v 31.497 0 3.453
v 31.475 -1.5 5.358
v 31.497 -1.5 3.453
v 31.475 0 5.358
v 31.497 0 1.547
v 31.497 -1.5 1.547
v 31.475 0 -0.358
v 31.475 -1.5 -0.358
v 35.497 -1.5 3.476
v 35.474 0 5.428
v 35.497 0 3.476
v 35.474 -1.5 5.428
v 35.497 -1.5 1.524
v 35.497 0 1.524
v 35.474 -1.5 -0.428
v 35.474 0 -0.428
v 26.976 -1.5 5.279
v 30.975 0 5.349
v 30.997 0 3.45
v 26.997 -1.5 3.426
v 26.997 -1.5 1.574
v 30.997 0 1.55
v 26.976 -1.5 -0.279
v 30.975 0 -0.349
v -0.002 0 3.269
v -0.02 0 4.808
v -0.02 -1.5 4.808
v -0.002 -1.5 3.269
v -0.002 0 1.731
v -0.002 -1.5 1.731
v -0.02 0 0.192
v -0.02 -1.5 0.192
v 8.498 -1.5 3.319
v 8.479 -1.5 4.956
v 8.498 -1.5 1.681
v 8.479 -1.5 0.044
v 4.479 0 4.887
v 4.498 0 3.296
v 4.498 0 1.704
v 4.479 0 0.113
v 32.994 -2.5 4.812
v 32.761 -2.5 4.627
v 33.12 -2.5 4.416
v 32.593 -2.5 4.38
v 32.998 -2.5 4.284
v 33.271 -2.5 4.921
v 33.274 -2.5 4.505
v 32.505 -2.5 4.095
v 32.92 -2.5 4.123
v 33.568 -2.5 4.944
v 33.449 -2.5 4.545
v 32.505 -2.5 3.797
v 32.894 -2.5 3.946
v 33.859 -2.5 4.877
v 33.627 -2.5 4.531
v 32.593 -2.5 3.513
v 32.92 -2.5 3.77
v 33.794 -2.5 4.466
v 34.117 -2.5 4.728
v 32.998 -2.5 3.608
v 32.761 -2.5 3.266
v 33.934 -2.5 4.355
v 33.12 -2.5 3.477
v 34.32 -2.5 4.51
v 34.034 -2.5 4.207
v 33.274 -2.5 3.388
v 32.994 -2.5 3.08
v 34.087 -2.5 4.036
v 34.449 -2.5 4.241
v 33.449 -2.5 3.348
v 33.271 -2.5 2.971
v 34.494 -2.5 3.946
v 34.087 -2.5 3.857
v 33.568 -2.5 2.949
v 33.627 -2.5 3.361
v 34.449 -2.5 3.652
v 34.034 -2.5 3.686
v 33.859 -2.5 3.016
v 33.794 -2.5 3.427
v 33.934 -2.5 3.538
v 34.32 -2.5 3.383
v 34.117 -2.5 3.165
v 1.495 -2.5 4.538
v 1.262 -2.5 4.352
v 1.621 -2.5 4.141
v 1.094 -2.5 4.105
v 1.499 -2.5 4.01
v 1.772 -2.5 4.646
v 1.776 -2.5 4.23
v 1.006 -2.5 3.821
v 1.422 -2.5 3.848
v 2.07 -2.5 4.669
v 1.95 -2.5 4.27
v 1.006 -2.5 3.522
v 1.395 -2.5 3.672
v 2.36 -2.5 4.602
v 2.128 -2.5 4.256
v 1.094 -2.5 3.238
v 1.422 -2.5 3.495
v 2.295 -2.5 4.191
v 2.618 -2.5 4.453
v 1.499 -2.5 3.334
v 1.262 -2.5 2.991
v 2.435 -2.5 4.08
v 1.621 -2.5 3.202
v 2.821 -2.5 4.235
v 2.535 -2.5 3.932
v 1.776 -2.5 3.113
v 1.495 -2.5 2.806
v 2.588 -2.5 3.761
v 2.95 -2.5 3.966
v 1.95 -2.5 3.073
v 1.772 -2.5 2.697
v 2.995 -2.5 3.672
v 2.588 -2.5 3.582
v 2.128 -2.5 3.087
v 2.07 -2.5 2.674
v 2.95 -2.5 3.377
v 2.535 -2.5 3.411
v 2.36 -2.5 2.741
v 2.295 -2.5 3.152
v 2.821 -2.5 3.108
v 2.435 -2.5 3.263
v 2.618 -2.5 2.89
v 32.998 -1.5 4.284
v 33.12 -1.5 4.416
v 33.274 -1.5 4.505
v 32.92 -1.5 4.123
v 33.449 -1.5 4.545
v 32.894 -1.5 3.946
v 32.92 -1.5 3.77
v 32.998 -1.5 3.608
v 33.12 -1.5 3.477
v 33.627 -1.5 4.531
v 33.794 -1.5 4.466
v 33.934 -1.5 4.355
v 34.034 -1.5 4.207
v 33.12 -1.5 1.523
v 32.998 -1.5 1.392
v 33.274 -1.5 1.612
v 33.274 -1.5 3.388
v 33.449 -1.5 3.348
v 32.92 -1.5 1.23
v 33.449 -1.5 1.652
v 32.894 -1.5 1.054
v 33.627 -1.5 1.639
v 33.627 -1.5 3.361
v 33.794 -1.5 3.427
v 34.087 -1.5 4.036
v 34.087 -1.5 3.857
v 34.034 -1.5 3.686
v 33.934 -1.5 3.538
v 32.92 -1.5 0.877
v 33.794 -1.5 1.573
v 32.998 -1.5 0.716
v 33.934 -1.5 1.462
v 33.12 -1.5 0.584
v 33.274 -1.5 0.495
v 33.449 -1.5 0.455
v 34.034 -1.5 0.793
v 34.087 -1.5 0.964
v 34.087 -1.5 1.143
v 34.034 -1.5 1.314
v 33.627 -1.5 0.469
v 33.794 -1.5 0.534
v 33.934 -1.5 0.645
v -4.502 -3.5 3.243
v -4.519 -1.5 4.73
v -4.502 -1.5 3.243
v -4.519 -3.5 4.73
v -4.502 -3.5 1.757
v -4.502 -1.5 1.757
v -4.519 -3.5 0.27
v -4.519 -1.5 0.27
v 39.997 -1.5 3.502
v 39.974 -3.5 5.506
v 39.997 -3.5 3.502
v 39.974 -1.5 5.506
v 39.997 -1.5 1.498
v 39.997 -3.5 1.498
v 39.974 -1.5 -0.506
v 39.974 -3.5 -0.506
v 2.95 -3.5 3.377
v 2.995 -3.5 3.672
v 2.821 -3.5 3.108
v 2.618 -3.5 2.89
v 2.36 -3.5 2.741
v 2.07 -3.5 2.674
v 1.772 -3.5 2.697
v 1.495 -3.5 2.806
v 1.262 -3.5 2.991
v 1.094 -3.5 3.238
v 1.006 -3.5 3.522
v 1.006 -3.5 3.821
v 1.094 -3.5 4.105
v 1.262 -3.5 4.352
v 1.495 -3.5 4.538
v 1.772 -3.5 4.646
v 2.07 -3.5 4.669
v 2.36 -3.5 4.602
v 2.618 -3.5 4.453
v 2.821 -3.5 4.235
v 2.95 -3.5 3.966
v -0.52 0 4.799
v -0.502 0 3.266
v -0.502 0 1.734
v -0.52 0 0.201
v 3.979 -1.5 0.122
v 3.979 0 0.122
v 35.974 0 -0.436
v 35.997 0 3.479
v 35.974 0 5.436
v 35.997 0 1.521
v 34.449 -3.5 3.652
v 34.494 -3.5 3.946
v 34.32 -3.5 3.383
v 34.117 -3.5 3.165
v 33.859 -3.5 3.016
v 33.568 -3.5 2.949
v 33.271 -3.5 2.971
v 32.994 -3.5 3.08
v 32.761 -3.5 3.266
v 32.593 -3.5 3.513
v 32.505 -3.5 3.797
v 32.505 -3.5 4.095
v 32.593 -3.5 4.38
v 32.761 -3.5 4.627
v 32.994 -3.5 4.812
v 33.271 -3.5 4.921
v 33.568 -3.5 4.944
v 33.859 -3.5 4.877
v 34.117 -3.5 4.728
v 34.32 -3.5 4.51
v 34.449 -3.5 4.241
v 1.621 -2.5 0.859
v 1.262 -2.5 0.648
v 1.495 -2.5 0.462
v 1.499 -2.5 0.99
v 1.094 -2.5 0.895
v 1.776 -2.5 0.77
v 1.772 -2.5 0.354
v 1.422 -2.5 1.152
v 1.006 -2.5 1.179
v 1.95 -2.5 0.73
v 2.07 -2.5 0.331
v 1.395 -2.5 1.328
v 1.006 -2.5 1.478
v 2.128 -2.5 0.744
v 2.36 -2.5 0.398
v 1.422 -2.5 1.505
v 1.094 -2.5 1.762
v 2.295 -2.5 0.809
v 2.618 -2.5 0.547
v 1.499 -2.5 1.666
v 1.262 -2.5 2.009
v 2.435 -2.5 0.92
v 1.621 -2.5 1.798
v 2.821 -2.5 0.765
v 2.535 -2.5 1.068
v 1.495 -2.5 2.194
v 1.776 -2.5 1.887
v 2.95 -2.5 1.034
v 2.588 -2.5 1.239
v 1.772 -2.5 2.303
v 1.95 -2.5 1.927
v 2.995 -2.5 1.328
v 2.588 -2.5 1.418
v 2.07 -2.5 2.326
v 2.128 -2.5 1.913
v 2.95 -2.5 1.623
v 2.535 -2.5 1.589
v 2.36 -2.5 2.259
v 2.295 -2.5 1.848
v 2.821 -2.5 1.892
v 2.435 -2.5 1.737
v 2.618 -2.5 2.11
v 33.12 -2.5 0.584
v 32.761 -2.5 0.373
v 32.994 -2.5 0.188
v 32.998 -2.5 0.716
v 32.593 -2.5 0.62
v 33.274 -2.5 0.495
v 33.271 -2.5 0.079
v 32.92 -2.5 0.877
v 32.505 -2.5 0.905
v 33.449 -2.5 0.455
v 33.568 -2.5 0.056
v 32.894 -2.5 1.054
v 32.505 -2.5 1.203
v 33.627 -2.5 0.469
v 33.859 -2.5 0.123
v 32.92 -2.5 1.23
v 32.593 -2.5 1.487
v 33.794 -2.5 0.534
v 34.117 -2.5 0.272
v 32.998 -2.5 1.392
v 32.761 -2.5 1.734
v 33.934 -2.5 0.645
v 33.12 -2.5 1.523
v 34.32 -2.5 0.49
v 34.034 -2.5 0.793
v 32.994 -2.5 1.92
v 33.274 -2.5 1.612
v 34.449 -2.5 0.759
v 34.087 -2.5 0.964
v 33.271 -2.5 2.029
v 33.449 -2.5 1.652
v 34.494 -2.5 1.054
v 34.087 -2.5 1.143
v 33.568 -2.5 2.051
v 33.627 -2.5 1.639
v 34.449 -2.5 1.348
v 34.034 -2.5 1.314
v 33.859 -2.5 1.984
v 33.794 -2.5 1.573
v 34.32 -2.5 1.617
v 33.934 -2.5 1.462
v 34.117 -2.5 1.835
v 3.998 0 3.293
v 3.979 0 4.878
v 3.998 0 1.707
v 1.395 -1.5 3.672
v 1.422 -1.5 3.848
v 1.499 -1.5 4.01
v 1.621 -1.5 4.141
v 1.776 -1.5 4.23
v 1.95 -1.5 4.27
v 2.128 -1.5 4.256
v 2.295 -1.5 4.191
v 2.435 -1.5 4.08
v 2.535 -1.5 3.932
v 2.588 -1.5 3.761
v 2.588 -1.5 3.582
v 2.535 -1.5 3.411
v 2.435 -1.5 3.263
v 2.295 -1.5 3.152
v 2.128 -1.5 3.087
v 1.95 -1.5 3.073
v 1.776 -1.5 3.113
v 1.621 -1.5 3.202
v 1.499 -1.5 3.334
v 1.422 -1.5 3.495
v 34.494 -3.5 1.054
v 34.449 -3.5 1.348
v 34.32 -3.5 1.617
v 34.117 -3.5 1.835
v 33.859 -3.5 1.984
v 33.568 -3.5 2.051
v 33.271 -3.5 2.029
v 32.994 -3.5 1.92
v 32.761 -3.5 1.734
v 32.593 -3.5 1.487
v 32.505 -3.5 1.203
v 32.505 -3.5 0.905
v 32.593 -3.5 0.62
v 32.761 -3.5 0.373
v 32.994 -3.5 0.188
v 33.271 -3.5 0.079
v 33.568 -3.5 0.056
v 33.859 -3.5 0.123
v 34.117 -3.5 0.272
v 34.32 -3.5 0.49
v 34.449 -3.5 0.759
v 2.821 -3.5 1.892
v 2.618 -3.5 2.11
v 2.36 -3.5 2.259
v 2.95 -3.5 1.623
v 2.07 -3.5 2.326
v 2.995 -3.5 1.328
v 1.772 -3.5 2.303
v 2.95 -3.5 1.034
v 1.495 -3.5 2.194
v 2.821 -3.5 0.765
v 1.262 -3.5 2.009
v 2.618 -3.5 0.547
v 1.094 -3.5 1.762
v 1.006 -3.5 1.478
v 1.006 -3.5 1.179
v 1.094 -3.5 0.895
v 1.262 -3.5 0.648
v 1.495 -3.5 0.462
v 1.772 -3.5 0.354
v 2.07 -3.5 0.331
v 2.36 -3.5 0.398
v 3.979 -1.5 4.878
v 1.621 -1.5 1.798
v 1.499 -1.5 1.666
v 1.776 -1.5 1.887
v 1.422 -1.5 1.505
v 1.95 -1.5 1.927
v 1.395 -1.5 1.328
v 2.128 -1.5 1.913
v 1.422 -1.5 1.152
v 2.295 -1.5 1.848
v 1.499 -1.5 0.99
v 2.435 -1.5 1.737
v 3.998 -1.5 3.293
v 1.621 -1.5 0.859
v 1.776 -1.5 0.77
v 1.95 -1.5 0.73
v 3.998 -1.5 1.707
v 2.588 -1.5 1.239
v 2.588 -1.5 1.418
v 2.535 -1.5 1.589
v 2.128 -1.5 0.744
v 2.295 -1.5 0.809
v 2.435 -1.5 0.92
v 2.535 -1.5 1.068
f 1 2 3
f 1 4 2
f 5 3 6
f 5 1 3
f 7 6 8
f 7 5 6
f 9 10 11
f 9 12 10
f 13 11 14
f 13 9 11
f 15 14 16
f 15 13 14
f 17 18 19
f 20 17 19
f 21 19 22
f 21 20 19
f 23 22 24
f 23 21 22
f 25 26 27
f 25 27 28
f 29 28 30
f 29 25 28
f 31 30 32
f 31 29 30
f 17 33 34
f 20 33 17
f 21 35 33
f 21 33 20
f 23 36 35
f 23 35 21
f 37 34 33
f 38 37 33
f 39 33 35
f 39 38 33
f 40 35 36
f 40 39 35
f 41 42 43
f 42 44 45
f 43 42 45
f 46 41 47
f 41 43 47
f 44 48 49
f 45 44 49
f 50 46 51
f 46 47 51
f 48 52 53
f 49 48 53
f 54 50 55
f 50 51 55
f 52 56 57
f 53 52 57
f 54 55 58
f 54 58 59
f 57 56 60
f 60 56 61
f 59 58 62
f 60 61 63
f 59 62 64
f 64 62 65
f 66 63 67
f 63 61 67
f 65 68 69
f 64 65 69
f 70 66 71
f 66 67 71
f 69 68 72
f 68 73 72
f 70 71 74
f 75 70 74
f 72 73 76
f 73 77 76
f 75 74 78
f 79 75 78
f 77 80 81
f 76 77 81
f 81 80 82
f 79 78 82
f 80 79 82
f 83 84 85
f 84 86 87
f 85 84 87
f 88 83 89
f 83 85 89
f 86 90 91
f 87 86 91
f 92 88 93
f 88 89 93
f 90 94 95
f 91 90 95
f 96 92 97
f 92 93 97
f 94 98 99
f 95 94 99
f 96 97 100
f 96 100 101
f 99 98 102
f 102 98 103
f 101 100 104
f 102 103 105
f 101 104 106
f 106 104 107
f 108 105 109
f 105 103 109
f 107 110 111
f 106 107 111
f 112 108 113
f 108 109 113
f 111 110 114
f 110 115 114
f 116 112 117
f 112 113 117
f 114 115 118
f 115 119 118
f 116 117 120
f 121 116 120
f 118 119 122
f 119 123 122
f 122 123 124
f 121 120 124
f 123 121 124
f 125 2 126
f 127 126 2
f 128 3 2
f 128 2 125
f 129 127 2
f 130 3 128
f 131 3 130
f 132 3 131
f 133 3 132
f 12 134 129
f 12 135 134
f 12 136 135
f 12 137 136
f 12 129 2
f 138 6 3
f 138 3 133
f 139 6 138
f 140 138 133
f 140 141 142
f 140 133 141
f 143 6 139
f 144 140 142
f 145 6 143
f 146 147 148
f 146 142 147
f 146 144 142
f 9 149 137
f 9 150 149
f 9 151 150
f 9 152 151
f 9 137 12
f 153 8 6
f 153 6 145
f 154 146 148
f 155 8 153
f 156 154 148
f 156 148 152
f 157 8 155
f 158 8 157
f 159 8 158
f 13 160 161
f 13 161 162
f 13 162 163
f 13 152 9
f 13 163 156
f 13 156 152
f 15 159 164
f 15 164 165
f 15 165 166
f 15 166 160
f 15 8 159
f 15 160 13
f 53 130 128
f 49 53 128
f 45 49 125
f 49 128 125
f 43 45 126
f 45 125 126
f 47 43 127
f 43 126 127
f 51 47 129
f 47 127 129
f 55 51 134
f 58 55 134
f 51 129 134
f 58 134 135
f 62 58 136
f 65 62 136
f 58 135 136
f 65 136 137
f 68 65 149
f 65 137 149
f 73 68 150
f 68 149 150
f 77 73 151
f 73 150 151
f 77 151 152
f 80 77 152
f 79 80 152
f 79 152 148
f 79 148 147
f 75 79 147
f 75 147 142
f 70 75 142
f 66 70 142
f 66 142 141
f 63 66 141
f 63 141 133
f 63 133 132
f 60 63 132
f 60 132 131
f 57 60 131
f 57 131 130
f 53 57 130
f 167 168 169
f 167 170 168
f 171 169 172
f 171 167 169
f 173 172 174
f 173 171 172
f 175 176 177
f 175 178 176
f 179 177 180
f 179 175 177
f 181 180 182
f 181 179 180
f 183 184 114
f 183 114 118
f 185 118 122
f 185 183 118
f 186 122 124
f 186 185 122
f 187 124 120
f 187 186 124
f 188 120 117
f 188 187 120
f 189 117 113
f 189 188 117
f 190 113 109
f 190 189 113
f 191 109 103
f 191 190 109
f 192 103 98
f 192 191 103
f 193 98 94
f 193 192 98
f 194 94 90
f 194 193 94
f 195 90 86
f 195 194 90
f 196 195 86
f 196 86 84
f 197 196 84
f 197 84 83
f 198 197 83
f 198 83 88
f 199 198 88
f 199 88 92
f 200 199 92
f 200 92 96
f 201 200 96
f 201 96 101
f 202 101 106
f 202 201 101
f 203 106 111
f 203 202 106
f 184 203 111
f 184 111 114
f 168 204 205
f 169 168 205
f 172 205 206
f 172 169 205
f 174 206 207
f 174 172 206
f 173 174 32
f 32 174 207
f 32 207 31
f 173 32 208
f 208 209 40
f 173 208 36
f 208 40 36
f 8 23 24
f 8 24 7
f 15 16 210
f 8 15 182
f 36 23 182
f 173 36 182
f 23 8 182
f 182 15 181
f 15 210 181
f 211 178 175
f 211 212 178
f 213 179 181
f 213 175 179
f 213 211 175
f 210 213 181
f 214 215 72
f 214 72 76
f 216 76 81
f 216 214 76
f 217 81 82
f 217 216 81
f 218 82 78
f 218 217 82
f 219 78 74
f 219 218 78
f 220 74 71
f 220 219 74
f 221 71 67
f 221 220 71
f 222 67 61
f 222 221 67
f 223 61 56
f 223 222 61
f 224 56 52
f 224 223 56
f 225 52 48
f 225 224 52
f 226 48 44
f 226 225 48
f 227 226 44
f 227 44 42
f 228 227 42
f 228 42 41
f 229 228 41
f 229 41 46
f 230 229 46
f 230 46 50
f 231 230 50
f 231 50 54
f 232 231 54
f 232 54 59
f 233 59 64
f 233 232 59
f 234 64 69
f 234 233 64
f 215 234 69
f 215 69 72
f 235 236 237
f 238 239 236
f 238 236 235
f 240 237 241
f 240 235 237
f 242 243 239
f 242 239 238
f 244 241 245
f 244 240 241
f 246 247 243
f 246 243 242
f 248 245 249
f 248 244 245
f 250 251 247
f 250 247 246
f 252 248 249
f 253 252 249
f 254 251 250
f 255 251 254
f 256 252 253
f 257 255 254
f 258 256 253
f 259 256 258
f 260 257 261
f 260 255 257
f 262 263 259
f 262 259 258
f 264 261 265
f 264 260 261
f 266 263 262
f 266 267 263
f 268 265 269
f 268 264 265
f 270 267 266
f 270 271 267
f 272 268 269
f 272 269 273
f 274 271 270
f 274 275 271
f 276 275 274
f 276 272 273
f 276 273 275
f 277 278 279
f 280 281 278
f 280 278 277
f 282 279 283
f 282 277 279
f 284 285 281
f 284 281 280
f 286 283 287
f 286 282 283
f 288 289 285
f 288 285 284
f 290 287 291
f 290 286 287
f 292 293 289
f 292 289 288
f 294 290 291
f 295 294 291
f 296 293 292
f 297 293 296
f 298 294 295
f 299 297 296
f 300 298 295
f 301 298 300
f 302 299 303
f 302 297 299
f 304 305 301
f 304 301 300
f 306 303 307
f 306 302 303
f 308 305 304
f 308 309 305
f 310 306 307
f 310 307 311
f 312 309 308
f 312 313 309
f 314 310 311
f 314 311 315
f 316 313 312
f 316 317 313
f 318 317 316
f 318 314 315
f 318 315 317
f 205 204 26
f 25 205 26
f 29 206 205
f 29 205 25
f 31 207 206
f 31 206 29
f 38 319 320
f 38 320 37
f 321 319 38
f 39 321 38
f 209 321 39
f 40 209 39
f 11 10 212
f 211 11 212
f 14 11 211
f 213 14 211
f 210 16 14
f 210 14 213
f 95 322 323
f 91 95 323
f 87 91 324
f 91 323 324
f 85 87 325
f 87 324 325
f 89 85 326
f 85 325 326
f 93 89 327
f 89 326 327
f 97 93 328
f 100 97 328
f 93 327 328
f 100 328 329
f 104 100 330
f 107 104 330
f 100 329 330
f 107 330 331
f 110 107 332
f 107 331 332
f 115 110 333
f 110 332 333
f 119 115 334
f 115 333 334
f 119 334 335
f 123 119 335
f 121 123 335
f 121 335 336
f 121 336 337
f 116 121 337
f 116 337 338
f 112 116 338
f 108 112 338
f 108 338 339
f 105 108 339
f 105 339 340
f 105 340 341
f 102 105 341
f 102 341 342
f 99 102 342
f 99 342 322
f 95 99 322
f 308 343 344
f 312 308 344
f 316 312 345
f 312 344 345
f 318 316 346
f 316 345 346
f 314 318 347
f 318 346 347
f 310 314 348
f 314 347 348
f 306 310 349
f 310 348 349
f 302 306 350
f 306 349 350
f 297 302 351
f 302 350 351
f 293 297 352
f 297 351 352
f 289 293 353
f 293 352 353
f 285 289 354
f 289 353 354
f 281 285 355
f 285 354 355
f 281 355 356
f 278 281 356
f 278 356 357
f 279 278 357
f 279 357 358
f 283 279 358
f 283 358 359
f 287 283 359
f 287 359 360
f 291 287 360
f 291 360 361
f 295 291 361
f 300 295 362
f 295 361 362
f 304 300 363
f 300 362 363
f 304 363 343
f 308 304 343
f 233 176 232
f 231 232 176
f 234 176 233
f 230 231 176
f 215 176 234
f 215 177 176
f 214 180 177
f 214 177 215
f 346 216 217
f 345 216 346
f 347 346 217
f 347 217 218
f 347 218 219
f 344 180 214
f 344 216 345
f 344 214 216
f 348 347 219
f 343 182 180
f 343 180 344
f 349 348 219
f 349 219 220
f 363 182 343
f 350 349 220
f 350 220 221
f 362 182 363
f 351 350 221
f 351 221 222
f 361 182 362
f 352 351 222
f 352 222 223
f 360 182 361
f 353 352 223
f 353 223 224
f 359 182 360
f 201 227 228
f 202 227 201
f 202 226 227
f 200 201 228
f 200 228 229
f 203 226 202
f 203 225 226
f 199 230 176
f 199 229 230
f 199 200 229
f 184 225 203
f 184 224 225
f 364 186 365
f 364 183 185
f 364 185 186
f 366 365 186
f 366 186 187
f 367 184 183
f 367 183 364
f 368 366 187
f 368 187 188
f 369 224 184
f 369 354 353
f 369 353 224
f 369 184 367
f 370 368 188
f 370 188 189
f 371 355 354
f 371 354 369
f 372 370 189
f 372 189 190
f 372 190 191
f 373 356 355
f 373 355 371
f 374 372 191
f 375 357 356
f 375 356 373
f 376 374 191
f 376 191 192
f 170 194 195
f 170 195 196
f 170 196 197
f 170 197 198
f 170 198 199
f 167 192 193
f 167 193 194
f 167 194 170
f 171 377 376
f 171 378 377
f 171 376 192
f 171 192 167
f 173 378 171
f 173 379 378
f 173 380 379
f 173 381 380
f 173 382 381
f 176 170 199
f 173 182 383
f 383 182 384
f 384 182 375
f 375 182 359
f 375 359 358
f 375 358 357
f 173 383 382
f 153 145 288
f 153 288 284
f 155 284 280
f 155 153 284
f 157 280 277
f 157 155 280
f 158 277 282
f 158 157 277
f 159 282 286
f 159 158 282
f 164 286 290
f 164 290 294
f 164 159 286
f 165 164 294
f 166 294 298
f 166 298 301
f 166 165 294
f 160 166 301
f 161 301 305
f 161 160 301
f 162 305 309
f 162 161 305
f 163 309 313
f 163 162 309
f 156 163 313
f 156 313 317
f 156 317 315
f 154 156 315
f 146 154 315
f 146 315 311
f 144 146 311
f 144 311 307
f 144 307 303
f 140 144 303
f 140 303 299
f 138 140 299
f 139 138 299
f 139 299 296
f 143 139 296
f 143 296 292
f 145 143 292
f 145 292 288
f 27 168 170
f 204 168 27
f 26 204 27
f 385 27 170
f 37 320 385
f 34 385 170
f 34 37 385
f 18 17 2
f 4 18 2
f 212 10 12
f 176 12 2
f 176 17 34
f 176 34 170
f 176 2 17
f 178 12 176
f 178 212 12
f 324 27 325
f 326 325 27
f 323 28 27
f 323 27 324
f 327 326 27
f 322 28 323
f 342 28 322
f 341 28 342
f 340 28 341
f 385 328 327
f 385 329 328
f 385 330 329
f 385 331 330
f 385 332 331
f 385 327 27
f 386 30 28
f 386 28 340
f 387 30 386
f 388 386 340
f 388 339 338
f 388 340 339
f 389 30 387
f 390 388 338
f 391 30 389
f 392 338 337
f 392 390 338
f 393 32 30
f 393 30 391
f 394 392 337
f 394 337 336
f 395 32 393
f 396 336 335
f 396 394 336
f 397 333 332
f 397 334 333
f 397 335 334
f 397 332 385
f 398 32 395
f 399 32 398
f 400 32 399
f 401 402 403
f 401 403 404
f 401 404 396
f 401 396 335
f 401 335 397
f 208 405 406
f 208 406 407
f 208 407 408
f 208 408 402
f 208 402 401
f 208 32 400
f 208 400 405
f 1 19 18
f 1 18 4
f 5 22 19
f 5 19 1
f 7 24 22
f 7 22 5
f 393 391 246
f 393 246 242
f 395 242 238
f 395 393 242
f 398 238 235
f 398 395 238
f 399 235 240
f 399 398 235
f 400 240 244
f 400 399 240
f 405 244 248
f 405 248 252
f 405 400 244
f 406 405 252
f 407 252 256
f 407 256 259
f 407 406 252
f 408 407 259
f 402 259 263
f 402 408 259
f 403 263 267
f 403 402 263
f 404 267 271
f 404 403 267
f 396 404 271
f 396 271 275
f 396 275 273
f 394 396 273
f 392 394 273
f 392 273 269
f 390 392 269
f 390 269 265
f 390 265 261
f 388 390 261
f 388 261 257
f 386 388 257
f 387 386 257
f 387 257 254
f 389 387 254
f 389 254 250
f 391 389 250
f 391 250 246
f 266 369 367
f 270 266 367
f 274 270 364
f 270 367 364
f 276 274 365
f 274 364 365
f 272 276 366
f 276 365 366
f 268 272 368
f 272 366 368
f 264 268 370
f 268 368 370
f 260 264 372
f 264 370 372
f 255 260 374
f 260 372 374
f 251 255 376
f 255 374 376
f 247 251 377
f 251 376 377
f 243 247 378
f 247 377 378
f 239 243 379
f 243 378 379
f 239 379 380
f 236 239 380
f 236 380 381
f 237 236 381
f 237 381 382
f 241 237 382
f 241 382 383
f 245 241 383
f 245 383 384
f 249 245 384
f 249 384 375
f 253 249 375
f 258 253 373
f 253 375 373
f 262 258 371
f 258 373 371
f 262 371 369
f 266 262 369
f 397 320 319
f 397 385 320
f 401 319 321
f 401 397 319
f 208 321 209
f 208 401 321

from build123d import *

# Parameters (mm, degrees)
EXTRUDE_1_DEPTH     = 2.5
SKETCH_5_R          = 0.6
CUT_EXTRUDE_1_DEPTH = 19.036421485
CUT_EXTRUDE_START   = -2
SKETCH_5_3_R        = 1
CUT_EXTRUDE_2_DEPTH = 1
REVOLVE_1_ANGLE     = 1
SKETCH_9_R          = 0.6
CUT_EXTRUDE_3_DEPTH = 41.426698916
SKETCH_9_3_R        = 1
CUT_EXTRUDE_4_DEPTH = 1
SKETCH_10_W         = 44.5
SKETCH_10_H         = 2.5
CUT_EXTRUDE_5_DEPTH = 41.528606999


with BuildPart() as part:
    # 草图4 → 凸台-拉伸1 (new body)
    with BuildSketch(Plane.XY):
        Polygon((8.5, -1.5), (17.75, -1.5), (17.75, -3.5), (-4.5, -3.5), (-4.5, -1.5), (-0.5, 0), (0, 0), (0, -1.5), (4, -1.5), (4, 0), (4.5, 0), align=None)
    extrude(amount=EXTRUDE_1_DEPTH)

    # 草图5 → 切除-拉伸1 (cut, through all)
    with BuildSketch(Plane(origin=(0, -1.5, 0), x_dir=(1, 0, 0), z_dir=(0, 1, 0))):
        with Locations(Location((2, -1.25, 0), (0, 0, 270))):
            Circle(SKETCH_5_R)
    extrude(amount=-CUT_EXTRUDE_1_DEPTH, mode=Mode.SUBTRACT)

    # 草图5<3> → 切除-拉伸2 (cut)
    with BuildSketch(Plane(origin=(0, -1.5, 0), x_dir=(1, 0, 0), z_dir=(0, 1, 0)).offset(CUT_EXTRUDE_START)):
        with Locations((2, -1.25)):
            Circle(SKETCH_5_3_R)
    extrude(amount=CUT_EXTRUDE_2_DEPTH, mode=Mode.SUBTRACT)

    # 镜向1: part across plane


with BuildPart() as part_1:
    add(part.part)
    add(part.part.mirror(Plane(origin=(17.75, 0, 2.5), x_dir=(0, 0, 1), z_dir=(1, 0, 0))))

    # 草图6 → 旋转1 (revolve)
    with BuildSketch(Plane.XY.offset(2.5)):
        Polygon((0, 0), (-0.5, 0), (-4.5, -1.5), (-4.5, -3.5), (40, -3.5), (40, -1.5), (36, 0), (35.5, 0), (35.5, -1.5), (31.5, -1.5), (31.5, 0), (31, 0), (27, -1.5), (8.5, -1.5), (4.5, 0), (4, 0), (4, -1.5), (0, -1.5), align=None)
    revolve(axis=Axis((-132.25, 94.8535776, 2.5), (0, -1, 0)), revolution_arc=REVOLVE_1_ANGLE)

    # 草图9 → 切除-拉伸3 (cut, through all)
    with BuildSketch(Plane(origin=(0, -1.5, 0), x_dir=(1, 0, 0), z_dir=(0, 1, 0))):
        with Locations(Location((1.994888171, -3.671537391, 0), (0, 0, 180))):
            Circle(SKETCH_9_R)
        with Locations(Location((33.493688748, -3.946423259, 0), (0, 0, 180))):
            Circle(SKETCH_9_R)
    extrude(amount=-CUT_EXTRUDE_3_DEPTH, mode=Mode.SUBTRACT)

    # 草图9<3> → 切除-拉伸4 (cut)
    with BuildSketch(Plane(origin=(0, -1.5, 0), x_dir=(1, 0, 0), z_dir=(0, 1, 0)).offset(CUT_EXTRUDE_START)):
        with Locations((1.994888171, -3.671537391)):
            Circle(SKETCH_9_3_R)
        with Locations((33.493688748, -3.946423259)):
            Circle(SKETCH_9_3_R)
    extrude(amount=CUT_EXTRUDE_4_DEPTH, mode=Mode.SUBTRACT)

    # 草图10 → 切除-拉伸5 (cut, through all)
    with BuildSketch(Plane(origin=(0, 0, 0), x_dir=(1, 0, 0), z_dir=(0, 1, 0))):
        with Locations((17.75, -1.25)):
            Rectangle(SKETCH_10_W, SKETCH_10_H)
    extrude(amount=-CUT_EXTRUDE_5_DEPTH, mode=Mode.SUBTRACT)

    # 镜向2: part across plane


with BuildPart() as part_2:
    add(part_1.part)
    add(part_1.part.mirror(Plane(origin=(40, -3.5, 2.5), x_dir=(1, 0, 0), z_dir=(0, 0, 1))))


solid = part_2.part
